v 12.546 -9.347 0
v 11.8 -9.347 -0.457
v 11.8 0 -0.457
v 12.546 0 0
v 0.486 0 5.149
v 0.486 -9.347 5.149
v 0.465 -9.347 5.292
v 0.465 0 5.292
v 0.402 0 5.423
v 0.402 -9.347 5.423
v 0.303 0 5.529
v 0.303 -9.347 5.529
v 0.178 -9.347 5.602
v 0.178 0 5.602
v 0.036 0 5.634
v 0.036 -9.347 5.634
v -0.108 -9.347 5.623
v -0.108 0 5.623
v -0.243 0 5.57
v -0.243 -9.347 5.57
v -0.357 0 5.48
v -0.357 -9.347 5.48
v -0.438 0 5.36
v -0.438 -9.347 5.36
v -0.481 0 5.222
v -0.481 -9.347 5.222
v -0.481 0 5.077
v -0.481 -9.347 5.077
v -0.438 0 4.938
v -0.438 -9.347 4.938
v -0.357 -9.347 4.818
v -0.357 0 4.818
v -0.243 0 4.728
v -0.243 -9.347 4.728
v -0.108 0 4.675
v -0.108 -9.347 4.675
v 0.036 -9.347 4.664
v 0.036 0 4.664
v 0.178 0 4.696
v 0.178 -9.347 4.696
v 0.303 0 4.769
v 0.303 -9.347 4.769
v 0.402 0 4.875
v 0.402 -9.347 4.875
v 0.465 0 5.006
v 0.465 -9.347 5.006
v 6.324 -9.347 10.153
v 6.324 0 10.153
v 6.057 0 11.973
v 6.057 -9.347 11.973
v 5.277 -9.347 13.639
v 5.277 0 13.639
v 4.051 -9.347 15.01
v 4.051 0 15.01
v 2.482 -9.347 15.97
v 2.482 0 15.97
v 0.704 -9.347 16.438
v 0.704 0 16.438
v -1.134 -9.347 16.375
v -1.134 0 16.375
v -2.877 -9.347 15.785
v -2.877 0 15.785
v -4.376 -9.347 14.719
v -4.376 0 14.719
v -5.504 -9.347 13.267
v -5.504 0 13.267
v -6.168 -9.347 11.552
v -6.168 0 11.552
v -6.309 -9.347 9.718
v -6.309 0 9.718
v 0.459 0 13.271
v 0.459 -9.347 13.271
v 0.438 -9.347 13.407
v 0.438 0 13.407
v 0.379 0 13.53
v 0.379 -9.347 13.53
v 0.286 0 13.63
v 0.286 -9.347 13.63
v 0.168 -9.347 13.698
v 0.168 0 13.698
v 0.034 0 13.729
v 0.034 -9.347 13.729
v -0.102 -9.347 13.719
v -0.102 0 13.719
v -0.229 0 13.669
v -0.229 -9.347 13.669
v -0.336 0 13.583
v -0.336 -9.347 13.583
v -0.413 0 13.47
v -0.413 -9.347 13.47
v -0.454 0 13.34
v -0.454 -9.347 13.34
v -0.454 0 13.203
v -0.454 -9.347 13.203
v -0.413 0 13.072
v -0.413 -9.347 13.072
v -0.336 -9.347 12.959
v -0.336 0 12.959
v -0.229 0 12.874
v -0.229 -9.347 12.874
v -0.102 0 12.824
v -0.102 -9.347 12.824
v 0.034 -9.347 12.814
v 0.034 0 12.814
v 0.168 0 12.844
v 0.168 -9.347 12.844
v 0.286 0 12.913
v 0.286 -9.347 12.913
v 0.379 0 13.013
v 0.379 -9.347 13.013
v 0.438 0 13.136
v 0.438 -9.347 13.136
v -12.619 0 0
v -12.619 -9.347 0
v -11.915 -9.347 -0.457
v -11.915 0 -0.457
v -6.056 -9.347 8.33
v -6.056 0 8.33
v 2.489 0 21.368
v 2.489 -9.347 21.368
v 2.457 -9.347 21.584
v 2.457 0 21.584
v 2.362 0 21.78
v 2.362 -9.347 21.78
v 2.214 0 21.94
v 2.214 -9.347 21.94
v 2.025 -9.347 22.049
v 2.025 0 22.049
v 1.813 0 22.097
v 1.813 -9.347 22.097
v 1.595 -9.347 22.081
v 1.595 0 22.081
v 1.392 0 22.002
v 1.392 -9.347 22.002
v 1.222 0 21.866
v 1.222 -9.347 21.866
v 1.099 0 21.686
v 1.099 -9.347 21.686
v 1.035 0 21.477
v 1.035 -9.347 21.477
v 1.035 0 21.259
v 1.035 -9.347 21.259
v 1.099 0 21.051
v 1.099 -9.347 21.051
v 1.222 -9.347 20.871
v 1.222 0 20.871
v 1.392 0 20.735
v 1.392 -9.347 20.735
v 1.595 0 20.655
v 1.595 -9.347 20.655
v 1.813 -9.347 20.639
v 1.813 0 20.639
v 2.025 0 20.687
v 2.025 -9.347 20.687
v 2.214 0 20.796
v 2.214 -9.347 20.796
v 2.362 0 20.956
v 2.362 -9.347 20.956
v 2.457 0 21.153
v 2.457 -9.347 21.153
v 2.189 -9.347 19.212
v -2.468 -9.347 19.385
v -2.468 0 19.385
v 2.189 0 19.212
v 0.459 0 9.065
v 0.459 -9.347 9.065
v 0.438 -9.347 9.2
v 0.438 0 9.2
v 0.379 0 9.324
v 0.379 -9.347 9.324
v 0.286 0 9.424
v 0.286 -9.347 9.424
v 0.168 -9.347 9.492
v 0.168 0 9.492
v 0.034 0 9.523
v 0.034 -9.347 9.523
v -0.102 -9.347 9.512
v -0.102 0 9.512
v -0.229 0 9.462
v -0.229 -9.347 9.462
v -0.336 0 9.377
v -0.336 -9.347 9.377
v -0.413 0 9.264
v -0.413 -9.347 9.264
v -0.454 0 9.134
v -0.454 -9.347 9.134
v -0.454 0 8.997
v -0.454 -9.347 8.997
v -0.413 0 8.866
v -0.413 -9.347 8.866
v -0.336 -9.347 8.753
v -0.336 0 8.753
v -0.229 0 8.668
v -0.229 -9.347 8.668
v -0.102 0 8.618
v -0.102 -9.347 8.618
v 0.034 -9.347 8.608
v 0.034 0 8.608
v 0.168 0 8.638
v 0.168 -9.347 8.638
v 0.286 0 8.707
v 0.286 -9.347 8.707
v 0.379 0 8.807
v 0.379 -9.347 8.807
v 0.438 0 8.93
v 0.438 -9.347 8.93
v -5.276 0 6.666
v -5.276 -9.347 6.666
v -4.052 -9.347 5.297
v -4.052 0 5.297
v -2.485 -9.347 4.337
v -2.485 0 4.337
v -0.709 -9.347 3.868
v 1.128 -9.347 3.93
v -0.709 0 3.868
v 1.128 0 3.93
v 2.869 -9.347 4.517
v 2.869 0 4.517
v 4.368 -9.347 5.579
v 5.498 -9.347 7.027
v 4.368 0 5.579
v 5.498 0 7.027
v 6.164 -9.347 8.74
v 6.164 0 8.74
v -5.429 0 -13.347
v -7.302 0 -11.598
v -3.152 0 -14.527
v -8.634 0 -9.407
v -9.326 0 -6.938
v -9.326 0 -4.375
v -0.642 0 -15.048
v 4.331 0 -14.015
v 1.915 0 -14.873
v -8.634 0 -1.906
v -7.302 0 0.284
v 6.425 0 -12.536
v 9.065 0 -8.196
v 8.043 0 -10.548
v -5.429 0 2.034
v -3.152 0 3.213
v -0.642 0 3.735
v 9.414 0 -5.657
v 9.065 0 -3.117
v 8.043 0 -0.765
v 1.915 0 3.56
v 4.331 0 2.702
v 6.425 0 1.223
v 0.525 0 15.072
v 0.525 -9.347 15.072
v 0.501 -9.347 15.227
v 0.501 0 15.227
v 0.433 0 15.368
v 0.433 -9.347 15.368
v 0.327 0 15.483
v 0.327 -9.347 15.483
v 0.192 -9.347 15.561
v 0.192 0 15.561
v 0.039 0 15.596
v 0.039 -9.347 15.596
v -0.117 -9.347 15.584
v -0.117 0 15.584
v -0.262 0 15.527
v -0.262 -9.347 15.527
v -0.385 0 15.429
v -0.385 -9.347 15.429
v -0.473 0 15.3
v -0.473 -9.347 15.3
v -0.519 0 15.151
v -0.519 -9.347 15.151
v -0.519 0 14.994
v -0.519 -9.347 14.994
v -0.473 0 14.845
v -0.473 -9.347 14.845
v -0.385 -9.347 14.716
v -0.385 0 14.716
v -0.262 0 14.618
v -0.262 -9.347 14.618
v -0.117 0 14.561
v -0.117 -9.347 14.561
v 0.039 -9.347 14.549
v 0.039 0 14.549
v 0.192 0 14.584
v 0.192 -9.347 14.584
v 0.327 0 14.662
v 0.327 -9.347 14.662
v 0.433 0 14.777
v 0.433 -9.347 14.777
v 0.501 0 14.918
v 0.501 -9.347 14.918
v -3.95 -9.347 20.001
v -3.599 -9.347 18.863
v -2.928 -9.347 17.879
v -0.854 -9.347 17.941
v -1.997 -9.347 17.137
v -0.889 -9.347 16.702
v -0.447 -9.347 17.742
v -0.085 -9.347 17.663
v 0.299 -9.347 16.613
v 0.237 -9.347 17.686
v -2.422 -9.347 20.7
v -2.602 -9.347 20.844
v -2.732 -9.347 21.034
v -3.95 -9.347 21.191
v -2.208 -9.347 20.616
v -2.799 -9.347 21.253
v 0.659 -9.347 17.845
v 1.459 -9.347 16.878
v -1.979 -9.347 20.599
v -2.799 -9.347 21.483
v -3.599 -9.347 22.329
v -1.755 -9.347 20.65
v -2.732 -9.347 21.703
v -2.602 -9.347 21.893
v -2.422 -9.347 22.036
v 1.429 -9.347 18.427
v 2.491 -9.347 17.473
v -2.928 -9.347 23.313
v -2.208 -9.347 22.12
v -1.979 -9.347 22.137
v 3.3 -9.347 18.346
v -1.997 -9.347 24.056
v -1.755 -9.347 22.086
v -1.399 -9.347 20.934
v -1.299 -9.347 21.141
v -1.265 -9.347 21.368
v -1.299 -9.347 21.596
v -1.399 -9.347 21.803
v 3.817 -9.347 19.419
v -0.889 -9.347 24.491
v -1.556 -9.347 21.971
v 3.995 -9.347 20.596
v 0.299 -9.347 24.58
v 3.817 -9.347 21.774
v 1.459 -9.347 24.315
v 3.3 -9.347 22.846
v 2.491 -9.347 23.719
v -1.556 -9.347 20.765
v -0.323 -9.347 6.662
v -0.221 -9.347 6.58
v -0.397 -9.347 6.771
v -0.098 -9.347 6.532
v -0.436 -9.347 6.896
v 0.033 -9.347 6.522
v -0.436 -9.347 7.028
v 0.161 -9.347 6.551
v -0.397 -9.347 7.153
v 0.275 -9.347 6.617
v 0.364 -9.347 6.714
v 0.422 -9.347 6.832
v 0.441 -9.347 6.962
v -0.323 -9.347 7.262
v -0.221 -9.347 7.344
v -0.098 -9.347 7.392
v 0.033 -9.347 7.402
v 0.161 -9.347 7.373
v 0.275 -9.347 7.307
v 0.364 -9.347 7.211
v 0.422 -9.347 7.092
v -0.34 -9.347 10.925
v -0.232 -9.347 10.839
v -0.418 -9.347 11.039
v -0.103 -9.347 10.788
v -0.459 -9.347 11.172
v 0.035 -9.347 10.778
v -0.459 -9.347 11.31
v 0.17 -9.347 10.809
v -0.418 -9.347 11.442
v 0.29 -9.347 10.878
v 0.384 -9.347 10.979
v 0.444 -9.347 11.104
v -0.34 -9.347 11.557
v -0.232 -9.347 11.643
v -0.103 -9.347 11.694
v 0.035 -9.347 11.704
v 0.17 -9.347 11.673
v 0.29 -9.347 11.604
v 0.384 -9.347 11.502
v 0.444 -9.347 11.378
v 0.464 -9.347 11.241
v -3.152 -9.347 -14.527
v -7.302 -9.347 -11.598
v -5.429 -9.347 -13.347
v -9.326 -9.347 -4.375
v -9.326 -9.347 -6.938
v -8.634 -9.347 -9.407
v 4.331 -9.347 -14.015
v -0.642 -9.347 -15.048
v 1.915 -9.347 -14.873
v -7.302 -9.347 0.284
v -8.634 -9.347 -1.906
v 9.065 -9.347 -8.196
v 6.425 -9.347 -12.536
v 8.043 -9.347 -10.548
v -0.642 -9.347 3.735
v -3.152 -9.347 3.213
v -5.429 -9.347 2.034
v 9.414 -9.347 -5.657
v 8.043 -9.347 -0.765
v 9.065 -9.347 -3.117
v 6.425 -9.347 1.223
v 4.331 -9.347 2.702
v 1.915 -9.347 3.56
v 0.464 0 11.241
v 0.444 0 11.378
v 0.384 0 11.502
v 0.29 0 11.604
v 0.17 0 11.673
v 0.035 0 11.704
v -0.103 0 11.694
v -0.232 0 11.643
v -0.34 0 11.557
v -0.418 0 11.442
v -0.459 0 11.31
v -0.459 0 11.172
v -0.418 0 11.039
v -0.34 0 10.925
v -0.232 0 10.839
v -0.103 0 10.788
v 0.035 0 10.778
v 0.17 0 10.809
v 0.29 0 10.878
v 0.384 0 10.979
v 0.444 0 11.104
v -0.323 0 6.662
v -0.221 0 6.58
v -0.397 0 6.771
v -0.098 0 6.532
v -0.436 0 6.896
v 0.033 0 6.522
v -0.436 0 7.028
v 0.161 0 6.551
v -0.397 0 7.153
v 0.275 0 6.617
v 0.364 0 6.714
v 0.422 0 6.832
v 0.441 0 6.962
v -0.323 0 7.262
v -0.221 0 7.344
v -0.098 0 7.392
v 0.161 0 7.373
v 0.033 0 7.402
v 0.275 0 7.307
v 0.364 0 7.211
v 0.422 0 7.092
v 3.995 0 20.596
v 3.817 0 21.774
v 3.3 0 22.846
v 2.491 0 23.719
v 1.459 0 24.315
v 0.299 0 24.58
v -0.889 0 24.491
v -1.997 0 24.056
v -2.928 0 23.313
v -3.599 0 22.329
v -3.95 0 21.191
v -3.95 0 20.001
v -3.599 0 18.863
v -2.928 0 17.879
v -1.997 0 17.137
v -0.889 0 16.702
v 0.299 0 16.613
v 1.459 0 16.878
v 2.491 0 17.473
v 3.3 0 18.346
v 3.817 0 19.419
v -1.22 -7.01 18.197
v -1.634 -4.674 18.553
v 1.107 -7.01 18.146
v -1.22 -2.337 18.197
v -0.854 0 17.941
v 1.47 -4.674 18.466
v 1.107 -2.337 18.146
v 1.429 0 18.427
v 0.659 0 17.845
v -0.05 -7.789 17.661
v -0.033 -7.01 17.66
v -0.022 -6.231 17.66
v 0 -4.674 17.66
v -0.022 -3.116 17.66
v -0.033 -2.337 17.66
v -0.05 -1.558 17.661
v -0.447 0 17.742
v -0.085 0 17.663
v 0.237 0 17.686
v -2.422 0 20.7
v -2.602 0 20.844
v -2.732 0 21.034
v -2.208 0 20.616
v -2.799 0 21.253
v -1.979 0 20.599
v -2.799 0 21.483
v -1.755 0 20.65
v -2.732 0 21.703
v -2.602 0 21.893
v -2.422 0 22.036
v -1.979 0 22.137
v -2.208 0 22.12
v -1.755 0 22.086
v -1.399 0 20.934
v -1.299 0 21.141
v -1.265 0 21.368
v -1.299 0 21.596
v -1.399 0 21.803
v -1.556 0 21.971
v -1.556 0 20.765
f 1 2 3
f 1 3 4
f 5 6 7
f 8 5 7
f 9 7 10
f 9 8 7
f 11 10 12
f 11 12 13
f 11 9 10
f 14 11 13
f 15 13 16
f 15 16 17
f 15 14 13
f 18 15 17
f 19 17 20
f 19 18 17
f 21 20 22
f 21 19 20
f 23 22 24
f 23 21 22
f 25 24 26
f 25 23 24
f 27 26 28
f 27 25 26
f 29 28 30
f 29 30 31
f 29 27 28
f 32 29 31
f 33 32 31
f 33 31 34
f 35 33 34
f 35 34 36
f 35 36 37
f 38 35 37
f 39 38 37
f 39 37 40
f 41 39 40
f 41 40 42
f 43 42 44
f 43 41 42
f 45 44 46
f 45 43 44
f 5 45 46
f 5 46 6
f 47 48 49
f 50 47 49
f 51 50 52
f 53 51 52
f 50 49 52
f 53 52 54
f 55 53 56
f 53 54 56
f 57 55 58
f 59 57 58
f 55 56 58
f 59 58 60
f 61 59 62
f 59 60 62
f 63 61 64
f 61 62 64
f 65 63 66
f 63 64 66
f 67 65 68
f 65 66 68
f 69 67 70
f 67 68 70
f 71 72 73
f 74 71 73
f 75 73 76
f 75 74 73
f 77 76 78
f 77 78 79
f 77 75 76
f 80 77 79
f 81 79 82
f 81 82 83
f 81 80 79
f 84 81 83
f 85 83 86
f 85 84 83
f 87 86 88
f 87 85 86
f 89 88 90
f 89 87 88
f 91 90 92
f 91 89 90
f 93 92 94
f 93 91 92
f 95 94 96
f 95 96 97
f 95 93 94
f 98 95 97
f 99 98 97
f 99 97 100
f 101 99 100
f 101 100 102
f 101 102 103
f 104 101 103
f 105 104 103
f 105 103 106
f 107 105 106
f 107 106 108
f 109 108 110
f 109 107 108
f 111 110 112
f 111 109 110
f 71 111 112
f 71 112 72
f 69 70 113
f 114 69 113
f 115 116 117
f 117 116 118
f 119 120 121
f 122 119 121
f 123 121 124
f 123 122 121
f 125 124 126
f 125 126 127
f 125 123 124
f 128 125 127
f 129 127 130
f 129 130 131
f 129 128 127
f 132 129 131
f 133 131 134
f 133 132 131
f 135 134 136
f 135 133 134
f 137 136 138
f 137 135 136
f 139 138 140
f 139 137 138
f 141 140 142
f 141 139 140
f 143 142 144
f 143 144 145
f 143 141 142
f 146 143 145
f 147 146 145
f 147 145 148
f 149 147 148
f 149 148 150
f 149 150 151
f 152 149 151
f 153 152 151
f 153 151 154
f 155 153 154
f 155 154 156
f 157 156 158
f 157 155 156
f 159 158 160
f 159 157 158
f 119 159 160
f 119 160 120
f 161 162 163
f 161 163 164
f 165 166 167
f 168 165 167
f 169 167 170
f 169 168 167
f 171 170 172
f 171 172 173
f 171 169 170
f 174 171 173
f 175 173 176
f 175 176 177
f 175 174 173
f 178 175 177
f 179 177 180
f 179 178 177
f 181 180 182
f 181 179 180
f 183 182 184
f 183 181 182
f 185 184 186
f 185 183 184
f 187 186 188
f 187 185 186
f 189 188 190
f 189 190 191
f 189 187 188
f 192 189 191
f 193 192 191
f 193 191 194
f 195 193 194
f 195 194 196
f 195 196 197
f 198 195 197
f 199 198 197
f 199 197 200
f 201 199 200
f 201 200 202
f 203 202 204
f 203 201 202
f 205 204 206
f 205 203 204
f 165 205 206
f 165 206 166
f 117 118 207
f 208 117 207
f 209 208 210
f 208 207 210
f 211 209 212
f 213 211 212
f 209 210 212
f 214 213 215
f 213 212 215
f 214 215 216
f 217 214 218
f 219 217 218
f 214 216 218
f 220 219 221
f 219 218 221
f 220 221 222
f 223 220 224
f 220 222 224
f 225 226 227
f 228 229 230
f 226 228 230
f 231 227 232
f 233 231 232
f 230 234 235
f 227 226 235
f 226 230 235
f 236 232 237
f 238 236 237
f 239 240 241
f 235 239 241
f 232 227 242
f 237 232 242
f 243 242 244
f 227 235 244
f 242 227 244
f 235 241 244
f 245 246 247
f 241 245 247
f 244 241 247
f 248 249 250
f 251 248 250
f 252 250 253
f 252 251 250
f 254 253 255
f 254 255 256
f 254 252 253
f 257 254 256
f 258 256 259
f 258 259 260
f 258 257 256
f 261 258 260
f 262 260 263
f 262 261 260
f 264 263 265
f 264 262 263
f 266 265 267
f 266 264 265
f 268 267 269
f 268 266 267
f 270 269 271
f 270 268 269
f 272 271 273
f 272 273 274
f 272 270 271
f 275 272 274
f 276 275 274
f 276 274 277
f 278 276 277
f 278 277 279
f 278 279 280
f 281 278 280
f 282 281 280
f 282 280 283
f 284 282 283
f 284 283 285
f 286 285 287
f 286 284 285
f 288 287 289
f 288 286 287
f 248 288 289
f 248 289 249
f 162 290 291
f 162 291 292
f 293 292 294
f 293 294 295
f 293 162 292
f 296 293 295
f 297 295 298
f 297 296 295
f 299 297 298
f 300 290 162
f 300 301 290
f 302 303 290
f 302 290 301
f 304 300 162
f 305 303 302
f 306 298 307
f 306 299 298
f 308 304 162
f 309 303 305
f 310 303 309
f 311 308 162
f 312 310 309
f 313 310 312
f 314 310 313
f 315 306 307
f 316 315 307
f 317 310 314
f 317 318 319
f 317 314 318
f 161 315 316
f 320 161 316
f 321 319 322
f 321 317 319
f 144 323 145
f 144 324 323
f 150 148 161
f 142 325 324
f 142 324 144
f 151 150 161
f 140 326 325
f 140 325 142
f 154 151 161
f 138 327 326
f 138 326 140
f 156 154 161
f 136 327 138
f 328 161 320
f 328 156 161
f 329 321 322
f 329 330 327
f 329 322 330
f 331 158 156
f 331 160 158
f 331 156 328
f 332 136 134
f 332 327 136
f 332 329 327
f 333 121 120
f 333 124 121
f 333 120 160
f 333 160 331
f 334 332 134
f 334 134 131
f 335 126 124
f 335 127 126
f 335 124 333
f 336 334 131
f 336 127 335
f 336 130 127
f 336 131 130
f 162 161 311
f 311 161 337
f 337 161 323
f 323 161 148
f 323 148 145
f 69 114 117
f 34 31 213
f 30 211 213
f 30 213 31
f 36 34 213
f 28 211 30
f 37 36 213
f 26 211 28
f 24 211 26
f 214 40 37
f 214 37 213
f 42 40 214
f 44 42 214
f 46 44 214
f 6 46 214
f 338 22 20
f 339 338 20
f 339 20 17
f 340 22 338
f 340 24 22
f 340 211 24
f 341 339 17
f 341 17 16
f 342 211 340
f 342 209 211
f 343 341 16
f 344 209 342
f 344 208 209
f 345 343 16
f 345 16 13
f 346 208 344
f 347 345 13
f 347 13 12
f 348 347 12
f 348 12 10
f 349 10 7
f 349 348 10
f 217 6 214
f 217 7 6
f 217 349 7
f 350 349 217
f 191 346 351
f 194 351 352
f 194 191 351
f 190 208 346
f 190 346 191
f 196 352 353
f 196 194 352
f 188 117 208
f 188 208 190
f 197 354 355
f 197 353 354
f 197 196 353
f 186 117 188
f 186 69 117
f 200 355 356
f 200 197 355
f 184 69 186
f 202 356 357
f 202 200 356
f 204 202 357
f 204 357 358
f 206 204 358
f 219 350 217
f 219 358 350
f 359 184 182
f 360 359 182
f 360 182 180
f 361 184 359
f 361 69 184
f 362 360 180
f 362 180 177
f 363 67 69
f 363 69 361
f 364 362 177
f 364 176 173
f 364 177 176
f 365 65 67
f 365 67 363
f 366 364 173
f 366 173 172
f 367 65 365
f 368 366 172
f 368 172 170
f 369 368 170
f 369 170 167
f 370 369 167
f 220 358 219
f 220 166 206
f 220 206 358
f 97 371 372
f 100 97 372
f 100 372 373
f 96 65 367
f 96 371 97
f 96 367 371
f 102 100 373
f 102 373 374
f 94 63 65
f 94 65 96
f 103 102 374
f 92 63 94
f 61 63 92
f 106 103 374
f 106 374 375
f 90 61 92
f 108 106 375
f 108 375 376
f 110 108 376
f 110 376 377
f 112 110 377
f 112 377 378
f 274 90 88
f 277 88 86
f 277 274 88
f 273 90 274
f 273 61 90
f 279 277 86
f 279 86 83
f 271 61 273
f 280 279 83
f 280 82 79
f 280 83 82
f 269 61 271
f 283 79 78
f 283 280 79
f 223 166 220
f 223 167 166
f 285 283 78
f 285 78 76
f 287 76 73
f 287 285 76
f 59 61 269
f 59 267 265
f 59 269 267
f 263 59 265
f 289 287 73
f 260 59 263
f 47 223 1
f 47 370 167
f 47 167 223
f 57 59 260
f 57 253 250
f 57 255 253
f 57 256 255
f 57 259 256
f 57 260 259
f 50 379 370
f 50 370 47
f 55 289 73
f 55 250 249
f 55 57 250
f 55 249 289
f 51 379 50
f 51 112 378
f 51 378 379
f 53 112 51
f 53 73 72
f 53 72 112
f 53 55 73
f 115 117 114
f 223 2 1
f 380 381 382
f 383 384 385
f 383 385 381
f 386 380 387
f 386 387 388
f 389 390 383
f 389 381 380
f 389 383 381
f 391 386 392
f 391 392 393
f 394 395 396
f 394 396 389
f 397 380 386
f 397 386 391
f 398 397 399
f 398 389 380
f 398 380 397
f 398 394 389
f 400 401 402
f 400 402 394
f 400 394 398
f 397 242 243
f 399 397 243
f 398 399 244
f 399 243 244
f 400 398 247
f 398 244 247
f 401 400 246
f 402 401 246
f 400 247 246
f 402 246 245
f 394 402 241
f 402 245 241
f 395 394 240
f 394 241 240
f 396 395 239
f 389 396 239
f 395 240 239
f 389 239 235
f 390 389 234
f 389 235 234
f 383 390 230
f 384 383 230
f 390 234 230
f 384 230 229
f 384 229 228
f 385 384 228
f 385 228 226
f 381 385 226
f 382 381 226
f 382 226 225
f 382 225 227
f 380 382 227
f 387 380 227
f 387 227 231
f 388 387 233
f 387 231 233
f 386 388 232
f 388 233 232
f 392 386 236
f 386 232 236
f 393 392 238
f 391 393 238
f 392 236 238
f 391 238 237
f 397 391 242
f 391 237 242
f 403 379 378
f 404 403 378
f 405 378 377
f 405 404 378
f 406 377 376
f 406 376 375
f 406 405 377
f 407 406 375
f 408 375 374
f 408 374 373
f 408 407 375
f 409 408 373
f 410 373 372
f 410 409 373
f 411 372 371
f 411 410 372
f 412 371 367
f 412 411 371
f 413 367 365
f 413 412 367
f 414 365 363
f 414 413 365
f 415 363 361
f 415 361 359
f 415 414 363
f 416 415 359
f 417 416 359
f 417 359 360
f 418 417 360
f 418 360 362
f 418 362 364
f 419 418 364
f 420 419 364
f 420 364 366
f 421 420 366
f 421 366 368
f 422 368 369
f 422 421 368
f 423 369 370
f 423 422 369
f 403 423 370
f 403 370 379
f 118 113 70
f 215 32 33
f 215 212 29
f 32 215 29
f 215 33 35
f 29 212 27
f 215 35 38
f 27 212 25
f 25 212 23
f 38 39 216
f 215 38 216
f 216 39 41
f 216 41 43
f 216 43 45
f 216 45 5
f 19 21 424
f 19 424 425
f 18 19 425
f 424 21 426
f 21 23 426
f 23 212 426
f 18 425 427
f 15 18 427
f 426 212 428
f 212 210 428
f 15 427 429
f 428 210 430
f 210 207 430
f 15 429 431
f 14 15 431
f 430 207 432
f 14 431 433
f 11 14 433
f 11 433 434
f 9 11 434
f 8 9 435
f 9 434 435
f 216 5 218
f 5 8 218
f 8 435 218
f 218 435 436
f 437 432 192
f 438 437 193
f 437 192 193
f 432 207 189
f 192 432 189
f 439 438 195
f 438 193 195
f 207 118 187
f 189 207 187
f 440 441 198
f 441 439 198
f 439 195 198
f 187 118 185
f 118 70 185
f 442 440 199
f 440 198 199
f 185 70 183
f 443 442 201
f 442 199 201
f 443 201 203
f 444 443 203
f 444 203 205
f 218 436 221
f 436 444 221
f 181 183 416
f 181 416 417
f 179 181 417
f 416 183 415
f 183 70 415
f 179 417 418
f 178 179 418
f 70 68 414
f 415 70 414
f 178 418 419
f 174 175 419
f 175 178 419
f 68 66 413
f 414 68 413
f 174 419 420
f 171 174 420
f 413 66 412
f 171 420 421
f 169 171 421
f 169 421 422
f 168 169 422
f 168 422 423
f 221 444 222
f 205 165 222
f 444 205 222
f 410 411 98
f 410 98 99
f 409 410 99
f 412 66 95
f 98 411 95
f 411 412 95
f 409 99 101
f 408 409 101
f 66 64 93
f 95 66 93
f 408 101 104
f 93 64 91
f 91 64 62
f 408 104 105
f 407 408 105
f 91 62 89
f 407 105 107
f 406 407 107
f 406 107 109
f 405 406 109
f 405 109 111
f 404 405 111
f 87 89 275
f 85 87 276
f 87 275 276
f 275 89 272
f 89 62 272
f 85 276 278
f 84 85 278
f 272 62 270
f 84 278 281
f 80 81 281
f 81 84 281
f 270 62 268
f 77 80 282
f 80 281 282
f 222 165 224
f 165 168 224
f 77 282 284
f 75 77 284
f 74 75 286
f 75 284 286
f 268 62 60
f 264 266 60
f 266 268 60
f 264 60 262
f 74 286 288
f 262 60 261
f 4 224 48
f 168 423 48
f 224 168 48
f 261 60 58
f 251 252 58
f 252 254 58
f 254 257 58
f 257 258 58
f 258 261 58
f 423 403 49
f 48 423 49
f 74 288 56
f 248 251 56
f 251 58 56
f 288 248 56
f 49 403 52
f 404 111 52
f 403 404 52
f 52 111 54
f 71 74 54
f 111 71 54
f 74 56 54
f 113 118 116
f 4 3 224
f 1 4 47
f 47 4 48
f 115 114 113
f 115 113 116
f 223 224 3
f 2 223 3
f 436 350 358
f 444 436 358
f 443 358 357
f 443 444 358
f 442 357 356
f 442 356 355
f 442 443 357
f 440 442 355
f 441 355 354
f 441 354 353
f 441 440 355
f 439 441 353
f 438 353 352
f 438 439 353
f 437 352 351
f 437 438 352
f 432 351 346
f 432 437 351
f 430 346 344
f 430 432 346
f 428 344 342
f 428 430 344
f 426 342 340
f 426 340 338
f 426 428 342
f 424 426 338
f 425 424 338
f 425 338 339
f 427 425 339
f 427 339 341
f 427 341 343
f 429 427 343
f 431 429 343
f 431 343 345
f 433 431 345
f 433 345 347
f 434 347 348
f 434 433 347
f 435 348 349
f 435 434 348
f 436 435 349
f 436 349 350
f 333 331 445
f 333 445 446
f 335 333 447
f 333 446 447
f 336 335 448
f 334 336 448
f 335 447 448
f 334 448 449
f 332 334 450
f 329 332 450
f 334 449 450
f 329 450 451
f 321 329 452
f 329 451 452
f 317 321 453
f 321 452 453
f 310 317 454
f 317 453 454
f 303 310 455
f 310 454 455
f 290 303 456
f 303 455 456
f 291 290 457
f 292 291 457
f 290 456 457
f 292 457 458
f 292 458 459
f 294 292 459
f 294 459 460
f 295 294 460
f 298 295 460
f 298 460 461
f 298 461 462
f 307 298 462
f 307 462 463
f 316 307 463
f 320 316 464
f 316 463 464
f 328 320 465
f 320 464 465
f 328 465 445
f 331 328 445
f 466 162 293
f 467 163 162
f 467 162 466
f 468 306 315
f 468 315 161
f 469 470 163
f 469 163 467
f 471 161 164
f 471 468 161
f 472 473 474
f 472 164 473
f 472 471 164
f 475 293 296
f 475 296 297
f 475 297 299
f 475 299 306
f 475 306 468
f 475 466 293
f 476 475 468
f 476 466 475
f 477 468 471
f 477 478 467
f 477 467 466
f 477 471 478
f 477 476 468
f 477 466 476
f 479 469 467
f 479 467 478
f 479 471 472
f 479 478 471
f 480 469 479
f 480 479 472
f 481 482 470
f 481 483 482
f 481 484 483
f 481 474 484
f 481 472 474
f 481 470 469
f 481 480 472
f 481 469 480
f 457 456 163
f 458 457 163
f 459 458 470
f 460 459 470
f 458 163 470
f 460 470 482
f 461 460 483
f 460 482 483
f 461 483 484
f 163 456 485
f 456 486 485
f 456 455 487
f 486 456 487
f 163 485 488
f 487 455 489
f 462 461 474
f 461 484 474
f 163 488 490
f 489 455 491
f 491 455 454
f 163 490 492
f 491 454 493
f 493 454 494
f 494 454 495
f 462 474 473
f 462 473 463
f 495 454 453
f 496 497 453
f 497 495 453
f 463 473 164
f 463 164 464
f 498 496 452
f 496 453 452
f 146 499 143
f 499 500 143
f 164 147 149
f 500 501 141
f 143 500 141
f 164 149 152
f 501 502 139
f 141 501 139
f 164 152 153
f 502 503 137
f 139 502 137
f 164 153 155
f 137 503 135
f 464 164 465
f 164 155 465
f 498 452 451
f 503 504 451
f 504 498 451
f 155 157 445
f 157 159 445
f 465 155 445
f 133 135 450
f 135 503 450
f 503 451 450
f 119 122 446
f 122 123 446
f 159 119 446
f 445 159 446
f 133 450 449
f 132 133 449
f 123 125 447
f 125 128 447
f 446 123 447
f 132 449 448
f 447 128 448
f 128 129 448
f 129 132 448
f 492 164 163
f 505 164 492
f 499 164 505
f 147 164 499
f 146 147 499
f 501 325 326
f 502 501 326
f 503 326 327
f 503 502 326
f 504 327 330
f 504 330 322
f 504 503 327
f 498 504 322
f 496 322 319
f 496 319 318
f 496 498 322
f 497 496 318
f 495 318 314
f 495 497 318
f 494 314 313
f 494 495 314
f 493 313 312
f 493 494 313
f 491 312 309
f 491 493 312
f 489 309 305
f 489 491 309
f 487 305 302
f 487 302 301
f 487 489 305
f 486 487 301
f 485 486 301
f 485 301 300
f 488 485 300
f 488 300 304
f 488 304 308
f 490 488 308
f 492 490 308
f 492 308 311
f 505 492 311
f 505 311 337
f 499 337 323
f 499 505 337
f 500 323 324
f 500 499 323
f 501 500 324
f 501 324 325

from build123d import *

# Parameters (mm, degrees)
F0_R     = 10.8549073209
F0_R_2   = 2.0961399234
F0_R_3   = 1.9872936117
F1_DEPTH = 25.4
F0_R_4   = 1.3219813679
F0_R_5   = 1.198723712
F0_R_6   = 1.2463724431
F0_R_7   = 1.2618566245
F0_R_8   = 1.2463706761
F0_R_9   = 1.4255288273
F0_R_10  = 25.5805449954
F2_SCALE = 0.46
F3_SCALE = 0.5
F4_SCALE = 1.6


with BuildPart() as f1:
    # F0 (on Front) → F1 (new body)
    with BuildSketch(Plane.XZ):
        with Locations((0, 55.9675879776)):
            Circle(F0_R)
        with BuildLine():
            add(Edge.make_bspline(
                [(-6.7059616558, 52.6756346226), (-4.4359472194, 50.3284138965), (-0.0227290904, 45.7650961948), (3.9970950385, 50.1011808863), (5.949253682, 52.2069260478)],
                knots=[0, 0, 0, 0, 0.5143671512, 1, 1, 1, 1], degree=3))
            Line((-6.7059616558, 52.6756346226), (5.949253682, 52.2069260478))
        make_face(mode=Mode.SUBTRACT)
        with Locations((-5.5341827683, 58.0658167601)):
            Circle(F0_R_2, mode=Mode.SUBTRACT)
        with Locations((4.7774747945, 58.0658167601)):
            Circle(F0_R_3, mode=Mode.SUBTRACT)
    extrude(amount=F1_DEPTH)


with BuildPart() as f1b:
    # F0 (on Front) → F1, piece 2 (new body)
    with BuildSketch(Plane.XZ):
        with BuildLine():
            ThreePointArc((16.751068317, 23.7489718951), (17.0767151789, 25.6570555689), (17.1857251032, 27.5896564126))
            ThreePointArc((17.1857251032, 27.5896564126), (-0.5915587824, 44.765197322), (-17.1450003982, 26.4072399586))
            ThreePointArc((-17.1450003982, 26.4072399586), (-16.9061447629, 24.5023571757), (-16.4563191548, 22.6360004699))
            ThreePointArc((-16.4563191548, 22.6360004699), (0.5756697104, 10.4135756109), (16.751068317, 23.7489718951))
        make_face()
        with Locations((0, 13.9918969944)):
            Circle(F0_R_4, mode=Mode.SUBTRACT)
        with Locations((0, 18.9186204225)):
            Circle(F0_R_5, mode=Mode.SUBTRACT)
        with Locations((0, 24.633621797)):
            Circle(F0_R_6, mode=Mode.SUBTRACT)
        with Locations((0, 30.5456910282)):
            Circle(F0_R_7, mode=Mode.SUBTRACT)
        with Locations((0, 36.063618958)):
            Circle(F0_R_8, mode=Mode.SUBTRACT)
        with Locations((0, 40.9578457475)):
            Circle(F0_R_9, mode=Mode.SUBTRACT)
        with BuildLine():
            ThreePointArc((-16.4563191548, 22.6360004699), (-16.9061447629, 24.5023571757), (-17.1450003982, 26.4072399586))
            Line((-17.1450003982, 26.4072399586), (-34.2900007963, 0))
            Line((-34.2900007963, 0), (-32.3767441537, -1.2421891099))
            Line((-32.3767441537, -1.2421891099), (-16.4563191548, 22.6360004699))
        make_face()
        with BuildLine():
            Line((34.0929292142, 0), (17.1857251032, 27.5896564126))
            ThreePointArc((17.1857251032, 27.5896564126), (17.0767151789, 25.6570555689), (16.751068317, 23.7489718951))
            Line((16.751068317, 23.7489718951), (32.0658897039, -1.2421891099))
            Line((32.0658897039, -1.2421891099), (34.0929292142, 0))
        make_face()
    extrude(amount=F1_DEPTH)


with BuildPart() as f1c:
    # F0 (on Front) → F1, piece 3 (new body)
    with BuildSketch(Plane.XZ):
        with Locations((0, -15.3713794425)):
            Circle(F0_R_10)
    extrude(amount=F1_DEPTH)


with BuildPart() as f1b_1:
    # F2: moved
    add(f1b.part.scale(F2_SCALE))


with BuildPart() as f1c_1:
    # F2: moved
    add(f1c.part.scale(F2_SCALE))


with BuildPart() as f1_1:
    # F2: moved
    add(f1.part.scale(F2_SCALE))


with BuildPart() as f1b_2:
    # F3: moved
    add(f1b_1.part.scale(F3_SCALE))


with BuildPart() as f1c_2:
    # F3: moved
    add(f1c_1.part.scale(F3_SCALE))


with BuildPart() as f1_2:
    # F3: moved
    add(f1_1.part.scale(F3_SCALE))


with BuildPart() as f1b_3:
    # F4: moved
    add(f1b_2.part.scale(F4_SCALE))


with BuildPart() as f1c_3:
    # F4: moved
    add(f1c_2.part.scale(F4_SCALE))


with BuildPart() as f1_3:
    # F4: moved
    add(f1_2.part.scale(F4_SCALE))


solid = Compound([f1b_3.part, f1c_3.part, f1_3.part])
